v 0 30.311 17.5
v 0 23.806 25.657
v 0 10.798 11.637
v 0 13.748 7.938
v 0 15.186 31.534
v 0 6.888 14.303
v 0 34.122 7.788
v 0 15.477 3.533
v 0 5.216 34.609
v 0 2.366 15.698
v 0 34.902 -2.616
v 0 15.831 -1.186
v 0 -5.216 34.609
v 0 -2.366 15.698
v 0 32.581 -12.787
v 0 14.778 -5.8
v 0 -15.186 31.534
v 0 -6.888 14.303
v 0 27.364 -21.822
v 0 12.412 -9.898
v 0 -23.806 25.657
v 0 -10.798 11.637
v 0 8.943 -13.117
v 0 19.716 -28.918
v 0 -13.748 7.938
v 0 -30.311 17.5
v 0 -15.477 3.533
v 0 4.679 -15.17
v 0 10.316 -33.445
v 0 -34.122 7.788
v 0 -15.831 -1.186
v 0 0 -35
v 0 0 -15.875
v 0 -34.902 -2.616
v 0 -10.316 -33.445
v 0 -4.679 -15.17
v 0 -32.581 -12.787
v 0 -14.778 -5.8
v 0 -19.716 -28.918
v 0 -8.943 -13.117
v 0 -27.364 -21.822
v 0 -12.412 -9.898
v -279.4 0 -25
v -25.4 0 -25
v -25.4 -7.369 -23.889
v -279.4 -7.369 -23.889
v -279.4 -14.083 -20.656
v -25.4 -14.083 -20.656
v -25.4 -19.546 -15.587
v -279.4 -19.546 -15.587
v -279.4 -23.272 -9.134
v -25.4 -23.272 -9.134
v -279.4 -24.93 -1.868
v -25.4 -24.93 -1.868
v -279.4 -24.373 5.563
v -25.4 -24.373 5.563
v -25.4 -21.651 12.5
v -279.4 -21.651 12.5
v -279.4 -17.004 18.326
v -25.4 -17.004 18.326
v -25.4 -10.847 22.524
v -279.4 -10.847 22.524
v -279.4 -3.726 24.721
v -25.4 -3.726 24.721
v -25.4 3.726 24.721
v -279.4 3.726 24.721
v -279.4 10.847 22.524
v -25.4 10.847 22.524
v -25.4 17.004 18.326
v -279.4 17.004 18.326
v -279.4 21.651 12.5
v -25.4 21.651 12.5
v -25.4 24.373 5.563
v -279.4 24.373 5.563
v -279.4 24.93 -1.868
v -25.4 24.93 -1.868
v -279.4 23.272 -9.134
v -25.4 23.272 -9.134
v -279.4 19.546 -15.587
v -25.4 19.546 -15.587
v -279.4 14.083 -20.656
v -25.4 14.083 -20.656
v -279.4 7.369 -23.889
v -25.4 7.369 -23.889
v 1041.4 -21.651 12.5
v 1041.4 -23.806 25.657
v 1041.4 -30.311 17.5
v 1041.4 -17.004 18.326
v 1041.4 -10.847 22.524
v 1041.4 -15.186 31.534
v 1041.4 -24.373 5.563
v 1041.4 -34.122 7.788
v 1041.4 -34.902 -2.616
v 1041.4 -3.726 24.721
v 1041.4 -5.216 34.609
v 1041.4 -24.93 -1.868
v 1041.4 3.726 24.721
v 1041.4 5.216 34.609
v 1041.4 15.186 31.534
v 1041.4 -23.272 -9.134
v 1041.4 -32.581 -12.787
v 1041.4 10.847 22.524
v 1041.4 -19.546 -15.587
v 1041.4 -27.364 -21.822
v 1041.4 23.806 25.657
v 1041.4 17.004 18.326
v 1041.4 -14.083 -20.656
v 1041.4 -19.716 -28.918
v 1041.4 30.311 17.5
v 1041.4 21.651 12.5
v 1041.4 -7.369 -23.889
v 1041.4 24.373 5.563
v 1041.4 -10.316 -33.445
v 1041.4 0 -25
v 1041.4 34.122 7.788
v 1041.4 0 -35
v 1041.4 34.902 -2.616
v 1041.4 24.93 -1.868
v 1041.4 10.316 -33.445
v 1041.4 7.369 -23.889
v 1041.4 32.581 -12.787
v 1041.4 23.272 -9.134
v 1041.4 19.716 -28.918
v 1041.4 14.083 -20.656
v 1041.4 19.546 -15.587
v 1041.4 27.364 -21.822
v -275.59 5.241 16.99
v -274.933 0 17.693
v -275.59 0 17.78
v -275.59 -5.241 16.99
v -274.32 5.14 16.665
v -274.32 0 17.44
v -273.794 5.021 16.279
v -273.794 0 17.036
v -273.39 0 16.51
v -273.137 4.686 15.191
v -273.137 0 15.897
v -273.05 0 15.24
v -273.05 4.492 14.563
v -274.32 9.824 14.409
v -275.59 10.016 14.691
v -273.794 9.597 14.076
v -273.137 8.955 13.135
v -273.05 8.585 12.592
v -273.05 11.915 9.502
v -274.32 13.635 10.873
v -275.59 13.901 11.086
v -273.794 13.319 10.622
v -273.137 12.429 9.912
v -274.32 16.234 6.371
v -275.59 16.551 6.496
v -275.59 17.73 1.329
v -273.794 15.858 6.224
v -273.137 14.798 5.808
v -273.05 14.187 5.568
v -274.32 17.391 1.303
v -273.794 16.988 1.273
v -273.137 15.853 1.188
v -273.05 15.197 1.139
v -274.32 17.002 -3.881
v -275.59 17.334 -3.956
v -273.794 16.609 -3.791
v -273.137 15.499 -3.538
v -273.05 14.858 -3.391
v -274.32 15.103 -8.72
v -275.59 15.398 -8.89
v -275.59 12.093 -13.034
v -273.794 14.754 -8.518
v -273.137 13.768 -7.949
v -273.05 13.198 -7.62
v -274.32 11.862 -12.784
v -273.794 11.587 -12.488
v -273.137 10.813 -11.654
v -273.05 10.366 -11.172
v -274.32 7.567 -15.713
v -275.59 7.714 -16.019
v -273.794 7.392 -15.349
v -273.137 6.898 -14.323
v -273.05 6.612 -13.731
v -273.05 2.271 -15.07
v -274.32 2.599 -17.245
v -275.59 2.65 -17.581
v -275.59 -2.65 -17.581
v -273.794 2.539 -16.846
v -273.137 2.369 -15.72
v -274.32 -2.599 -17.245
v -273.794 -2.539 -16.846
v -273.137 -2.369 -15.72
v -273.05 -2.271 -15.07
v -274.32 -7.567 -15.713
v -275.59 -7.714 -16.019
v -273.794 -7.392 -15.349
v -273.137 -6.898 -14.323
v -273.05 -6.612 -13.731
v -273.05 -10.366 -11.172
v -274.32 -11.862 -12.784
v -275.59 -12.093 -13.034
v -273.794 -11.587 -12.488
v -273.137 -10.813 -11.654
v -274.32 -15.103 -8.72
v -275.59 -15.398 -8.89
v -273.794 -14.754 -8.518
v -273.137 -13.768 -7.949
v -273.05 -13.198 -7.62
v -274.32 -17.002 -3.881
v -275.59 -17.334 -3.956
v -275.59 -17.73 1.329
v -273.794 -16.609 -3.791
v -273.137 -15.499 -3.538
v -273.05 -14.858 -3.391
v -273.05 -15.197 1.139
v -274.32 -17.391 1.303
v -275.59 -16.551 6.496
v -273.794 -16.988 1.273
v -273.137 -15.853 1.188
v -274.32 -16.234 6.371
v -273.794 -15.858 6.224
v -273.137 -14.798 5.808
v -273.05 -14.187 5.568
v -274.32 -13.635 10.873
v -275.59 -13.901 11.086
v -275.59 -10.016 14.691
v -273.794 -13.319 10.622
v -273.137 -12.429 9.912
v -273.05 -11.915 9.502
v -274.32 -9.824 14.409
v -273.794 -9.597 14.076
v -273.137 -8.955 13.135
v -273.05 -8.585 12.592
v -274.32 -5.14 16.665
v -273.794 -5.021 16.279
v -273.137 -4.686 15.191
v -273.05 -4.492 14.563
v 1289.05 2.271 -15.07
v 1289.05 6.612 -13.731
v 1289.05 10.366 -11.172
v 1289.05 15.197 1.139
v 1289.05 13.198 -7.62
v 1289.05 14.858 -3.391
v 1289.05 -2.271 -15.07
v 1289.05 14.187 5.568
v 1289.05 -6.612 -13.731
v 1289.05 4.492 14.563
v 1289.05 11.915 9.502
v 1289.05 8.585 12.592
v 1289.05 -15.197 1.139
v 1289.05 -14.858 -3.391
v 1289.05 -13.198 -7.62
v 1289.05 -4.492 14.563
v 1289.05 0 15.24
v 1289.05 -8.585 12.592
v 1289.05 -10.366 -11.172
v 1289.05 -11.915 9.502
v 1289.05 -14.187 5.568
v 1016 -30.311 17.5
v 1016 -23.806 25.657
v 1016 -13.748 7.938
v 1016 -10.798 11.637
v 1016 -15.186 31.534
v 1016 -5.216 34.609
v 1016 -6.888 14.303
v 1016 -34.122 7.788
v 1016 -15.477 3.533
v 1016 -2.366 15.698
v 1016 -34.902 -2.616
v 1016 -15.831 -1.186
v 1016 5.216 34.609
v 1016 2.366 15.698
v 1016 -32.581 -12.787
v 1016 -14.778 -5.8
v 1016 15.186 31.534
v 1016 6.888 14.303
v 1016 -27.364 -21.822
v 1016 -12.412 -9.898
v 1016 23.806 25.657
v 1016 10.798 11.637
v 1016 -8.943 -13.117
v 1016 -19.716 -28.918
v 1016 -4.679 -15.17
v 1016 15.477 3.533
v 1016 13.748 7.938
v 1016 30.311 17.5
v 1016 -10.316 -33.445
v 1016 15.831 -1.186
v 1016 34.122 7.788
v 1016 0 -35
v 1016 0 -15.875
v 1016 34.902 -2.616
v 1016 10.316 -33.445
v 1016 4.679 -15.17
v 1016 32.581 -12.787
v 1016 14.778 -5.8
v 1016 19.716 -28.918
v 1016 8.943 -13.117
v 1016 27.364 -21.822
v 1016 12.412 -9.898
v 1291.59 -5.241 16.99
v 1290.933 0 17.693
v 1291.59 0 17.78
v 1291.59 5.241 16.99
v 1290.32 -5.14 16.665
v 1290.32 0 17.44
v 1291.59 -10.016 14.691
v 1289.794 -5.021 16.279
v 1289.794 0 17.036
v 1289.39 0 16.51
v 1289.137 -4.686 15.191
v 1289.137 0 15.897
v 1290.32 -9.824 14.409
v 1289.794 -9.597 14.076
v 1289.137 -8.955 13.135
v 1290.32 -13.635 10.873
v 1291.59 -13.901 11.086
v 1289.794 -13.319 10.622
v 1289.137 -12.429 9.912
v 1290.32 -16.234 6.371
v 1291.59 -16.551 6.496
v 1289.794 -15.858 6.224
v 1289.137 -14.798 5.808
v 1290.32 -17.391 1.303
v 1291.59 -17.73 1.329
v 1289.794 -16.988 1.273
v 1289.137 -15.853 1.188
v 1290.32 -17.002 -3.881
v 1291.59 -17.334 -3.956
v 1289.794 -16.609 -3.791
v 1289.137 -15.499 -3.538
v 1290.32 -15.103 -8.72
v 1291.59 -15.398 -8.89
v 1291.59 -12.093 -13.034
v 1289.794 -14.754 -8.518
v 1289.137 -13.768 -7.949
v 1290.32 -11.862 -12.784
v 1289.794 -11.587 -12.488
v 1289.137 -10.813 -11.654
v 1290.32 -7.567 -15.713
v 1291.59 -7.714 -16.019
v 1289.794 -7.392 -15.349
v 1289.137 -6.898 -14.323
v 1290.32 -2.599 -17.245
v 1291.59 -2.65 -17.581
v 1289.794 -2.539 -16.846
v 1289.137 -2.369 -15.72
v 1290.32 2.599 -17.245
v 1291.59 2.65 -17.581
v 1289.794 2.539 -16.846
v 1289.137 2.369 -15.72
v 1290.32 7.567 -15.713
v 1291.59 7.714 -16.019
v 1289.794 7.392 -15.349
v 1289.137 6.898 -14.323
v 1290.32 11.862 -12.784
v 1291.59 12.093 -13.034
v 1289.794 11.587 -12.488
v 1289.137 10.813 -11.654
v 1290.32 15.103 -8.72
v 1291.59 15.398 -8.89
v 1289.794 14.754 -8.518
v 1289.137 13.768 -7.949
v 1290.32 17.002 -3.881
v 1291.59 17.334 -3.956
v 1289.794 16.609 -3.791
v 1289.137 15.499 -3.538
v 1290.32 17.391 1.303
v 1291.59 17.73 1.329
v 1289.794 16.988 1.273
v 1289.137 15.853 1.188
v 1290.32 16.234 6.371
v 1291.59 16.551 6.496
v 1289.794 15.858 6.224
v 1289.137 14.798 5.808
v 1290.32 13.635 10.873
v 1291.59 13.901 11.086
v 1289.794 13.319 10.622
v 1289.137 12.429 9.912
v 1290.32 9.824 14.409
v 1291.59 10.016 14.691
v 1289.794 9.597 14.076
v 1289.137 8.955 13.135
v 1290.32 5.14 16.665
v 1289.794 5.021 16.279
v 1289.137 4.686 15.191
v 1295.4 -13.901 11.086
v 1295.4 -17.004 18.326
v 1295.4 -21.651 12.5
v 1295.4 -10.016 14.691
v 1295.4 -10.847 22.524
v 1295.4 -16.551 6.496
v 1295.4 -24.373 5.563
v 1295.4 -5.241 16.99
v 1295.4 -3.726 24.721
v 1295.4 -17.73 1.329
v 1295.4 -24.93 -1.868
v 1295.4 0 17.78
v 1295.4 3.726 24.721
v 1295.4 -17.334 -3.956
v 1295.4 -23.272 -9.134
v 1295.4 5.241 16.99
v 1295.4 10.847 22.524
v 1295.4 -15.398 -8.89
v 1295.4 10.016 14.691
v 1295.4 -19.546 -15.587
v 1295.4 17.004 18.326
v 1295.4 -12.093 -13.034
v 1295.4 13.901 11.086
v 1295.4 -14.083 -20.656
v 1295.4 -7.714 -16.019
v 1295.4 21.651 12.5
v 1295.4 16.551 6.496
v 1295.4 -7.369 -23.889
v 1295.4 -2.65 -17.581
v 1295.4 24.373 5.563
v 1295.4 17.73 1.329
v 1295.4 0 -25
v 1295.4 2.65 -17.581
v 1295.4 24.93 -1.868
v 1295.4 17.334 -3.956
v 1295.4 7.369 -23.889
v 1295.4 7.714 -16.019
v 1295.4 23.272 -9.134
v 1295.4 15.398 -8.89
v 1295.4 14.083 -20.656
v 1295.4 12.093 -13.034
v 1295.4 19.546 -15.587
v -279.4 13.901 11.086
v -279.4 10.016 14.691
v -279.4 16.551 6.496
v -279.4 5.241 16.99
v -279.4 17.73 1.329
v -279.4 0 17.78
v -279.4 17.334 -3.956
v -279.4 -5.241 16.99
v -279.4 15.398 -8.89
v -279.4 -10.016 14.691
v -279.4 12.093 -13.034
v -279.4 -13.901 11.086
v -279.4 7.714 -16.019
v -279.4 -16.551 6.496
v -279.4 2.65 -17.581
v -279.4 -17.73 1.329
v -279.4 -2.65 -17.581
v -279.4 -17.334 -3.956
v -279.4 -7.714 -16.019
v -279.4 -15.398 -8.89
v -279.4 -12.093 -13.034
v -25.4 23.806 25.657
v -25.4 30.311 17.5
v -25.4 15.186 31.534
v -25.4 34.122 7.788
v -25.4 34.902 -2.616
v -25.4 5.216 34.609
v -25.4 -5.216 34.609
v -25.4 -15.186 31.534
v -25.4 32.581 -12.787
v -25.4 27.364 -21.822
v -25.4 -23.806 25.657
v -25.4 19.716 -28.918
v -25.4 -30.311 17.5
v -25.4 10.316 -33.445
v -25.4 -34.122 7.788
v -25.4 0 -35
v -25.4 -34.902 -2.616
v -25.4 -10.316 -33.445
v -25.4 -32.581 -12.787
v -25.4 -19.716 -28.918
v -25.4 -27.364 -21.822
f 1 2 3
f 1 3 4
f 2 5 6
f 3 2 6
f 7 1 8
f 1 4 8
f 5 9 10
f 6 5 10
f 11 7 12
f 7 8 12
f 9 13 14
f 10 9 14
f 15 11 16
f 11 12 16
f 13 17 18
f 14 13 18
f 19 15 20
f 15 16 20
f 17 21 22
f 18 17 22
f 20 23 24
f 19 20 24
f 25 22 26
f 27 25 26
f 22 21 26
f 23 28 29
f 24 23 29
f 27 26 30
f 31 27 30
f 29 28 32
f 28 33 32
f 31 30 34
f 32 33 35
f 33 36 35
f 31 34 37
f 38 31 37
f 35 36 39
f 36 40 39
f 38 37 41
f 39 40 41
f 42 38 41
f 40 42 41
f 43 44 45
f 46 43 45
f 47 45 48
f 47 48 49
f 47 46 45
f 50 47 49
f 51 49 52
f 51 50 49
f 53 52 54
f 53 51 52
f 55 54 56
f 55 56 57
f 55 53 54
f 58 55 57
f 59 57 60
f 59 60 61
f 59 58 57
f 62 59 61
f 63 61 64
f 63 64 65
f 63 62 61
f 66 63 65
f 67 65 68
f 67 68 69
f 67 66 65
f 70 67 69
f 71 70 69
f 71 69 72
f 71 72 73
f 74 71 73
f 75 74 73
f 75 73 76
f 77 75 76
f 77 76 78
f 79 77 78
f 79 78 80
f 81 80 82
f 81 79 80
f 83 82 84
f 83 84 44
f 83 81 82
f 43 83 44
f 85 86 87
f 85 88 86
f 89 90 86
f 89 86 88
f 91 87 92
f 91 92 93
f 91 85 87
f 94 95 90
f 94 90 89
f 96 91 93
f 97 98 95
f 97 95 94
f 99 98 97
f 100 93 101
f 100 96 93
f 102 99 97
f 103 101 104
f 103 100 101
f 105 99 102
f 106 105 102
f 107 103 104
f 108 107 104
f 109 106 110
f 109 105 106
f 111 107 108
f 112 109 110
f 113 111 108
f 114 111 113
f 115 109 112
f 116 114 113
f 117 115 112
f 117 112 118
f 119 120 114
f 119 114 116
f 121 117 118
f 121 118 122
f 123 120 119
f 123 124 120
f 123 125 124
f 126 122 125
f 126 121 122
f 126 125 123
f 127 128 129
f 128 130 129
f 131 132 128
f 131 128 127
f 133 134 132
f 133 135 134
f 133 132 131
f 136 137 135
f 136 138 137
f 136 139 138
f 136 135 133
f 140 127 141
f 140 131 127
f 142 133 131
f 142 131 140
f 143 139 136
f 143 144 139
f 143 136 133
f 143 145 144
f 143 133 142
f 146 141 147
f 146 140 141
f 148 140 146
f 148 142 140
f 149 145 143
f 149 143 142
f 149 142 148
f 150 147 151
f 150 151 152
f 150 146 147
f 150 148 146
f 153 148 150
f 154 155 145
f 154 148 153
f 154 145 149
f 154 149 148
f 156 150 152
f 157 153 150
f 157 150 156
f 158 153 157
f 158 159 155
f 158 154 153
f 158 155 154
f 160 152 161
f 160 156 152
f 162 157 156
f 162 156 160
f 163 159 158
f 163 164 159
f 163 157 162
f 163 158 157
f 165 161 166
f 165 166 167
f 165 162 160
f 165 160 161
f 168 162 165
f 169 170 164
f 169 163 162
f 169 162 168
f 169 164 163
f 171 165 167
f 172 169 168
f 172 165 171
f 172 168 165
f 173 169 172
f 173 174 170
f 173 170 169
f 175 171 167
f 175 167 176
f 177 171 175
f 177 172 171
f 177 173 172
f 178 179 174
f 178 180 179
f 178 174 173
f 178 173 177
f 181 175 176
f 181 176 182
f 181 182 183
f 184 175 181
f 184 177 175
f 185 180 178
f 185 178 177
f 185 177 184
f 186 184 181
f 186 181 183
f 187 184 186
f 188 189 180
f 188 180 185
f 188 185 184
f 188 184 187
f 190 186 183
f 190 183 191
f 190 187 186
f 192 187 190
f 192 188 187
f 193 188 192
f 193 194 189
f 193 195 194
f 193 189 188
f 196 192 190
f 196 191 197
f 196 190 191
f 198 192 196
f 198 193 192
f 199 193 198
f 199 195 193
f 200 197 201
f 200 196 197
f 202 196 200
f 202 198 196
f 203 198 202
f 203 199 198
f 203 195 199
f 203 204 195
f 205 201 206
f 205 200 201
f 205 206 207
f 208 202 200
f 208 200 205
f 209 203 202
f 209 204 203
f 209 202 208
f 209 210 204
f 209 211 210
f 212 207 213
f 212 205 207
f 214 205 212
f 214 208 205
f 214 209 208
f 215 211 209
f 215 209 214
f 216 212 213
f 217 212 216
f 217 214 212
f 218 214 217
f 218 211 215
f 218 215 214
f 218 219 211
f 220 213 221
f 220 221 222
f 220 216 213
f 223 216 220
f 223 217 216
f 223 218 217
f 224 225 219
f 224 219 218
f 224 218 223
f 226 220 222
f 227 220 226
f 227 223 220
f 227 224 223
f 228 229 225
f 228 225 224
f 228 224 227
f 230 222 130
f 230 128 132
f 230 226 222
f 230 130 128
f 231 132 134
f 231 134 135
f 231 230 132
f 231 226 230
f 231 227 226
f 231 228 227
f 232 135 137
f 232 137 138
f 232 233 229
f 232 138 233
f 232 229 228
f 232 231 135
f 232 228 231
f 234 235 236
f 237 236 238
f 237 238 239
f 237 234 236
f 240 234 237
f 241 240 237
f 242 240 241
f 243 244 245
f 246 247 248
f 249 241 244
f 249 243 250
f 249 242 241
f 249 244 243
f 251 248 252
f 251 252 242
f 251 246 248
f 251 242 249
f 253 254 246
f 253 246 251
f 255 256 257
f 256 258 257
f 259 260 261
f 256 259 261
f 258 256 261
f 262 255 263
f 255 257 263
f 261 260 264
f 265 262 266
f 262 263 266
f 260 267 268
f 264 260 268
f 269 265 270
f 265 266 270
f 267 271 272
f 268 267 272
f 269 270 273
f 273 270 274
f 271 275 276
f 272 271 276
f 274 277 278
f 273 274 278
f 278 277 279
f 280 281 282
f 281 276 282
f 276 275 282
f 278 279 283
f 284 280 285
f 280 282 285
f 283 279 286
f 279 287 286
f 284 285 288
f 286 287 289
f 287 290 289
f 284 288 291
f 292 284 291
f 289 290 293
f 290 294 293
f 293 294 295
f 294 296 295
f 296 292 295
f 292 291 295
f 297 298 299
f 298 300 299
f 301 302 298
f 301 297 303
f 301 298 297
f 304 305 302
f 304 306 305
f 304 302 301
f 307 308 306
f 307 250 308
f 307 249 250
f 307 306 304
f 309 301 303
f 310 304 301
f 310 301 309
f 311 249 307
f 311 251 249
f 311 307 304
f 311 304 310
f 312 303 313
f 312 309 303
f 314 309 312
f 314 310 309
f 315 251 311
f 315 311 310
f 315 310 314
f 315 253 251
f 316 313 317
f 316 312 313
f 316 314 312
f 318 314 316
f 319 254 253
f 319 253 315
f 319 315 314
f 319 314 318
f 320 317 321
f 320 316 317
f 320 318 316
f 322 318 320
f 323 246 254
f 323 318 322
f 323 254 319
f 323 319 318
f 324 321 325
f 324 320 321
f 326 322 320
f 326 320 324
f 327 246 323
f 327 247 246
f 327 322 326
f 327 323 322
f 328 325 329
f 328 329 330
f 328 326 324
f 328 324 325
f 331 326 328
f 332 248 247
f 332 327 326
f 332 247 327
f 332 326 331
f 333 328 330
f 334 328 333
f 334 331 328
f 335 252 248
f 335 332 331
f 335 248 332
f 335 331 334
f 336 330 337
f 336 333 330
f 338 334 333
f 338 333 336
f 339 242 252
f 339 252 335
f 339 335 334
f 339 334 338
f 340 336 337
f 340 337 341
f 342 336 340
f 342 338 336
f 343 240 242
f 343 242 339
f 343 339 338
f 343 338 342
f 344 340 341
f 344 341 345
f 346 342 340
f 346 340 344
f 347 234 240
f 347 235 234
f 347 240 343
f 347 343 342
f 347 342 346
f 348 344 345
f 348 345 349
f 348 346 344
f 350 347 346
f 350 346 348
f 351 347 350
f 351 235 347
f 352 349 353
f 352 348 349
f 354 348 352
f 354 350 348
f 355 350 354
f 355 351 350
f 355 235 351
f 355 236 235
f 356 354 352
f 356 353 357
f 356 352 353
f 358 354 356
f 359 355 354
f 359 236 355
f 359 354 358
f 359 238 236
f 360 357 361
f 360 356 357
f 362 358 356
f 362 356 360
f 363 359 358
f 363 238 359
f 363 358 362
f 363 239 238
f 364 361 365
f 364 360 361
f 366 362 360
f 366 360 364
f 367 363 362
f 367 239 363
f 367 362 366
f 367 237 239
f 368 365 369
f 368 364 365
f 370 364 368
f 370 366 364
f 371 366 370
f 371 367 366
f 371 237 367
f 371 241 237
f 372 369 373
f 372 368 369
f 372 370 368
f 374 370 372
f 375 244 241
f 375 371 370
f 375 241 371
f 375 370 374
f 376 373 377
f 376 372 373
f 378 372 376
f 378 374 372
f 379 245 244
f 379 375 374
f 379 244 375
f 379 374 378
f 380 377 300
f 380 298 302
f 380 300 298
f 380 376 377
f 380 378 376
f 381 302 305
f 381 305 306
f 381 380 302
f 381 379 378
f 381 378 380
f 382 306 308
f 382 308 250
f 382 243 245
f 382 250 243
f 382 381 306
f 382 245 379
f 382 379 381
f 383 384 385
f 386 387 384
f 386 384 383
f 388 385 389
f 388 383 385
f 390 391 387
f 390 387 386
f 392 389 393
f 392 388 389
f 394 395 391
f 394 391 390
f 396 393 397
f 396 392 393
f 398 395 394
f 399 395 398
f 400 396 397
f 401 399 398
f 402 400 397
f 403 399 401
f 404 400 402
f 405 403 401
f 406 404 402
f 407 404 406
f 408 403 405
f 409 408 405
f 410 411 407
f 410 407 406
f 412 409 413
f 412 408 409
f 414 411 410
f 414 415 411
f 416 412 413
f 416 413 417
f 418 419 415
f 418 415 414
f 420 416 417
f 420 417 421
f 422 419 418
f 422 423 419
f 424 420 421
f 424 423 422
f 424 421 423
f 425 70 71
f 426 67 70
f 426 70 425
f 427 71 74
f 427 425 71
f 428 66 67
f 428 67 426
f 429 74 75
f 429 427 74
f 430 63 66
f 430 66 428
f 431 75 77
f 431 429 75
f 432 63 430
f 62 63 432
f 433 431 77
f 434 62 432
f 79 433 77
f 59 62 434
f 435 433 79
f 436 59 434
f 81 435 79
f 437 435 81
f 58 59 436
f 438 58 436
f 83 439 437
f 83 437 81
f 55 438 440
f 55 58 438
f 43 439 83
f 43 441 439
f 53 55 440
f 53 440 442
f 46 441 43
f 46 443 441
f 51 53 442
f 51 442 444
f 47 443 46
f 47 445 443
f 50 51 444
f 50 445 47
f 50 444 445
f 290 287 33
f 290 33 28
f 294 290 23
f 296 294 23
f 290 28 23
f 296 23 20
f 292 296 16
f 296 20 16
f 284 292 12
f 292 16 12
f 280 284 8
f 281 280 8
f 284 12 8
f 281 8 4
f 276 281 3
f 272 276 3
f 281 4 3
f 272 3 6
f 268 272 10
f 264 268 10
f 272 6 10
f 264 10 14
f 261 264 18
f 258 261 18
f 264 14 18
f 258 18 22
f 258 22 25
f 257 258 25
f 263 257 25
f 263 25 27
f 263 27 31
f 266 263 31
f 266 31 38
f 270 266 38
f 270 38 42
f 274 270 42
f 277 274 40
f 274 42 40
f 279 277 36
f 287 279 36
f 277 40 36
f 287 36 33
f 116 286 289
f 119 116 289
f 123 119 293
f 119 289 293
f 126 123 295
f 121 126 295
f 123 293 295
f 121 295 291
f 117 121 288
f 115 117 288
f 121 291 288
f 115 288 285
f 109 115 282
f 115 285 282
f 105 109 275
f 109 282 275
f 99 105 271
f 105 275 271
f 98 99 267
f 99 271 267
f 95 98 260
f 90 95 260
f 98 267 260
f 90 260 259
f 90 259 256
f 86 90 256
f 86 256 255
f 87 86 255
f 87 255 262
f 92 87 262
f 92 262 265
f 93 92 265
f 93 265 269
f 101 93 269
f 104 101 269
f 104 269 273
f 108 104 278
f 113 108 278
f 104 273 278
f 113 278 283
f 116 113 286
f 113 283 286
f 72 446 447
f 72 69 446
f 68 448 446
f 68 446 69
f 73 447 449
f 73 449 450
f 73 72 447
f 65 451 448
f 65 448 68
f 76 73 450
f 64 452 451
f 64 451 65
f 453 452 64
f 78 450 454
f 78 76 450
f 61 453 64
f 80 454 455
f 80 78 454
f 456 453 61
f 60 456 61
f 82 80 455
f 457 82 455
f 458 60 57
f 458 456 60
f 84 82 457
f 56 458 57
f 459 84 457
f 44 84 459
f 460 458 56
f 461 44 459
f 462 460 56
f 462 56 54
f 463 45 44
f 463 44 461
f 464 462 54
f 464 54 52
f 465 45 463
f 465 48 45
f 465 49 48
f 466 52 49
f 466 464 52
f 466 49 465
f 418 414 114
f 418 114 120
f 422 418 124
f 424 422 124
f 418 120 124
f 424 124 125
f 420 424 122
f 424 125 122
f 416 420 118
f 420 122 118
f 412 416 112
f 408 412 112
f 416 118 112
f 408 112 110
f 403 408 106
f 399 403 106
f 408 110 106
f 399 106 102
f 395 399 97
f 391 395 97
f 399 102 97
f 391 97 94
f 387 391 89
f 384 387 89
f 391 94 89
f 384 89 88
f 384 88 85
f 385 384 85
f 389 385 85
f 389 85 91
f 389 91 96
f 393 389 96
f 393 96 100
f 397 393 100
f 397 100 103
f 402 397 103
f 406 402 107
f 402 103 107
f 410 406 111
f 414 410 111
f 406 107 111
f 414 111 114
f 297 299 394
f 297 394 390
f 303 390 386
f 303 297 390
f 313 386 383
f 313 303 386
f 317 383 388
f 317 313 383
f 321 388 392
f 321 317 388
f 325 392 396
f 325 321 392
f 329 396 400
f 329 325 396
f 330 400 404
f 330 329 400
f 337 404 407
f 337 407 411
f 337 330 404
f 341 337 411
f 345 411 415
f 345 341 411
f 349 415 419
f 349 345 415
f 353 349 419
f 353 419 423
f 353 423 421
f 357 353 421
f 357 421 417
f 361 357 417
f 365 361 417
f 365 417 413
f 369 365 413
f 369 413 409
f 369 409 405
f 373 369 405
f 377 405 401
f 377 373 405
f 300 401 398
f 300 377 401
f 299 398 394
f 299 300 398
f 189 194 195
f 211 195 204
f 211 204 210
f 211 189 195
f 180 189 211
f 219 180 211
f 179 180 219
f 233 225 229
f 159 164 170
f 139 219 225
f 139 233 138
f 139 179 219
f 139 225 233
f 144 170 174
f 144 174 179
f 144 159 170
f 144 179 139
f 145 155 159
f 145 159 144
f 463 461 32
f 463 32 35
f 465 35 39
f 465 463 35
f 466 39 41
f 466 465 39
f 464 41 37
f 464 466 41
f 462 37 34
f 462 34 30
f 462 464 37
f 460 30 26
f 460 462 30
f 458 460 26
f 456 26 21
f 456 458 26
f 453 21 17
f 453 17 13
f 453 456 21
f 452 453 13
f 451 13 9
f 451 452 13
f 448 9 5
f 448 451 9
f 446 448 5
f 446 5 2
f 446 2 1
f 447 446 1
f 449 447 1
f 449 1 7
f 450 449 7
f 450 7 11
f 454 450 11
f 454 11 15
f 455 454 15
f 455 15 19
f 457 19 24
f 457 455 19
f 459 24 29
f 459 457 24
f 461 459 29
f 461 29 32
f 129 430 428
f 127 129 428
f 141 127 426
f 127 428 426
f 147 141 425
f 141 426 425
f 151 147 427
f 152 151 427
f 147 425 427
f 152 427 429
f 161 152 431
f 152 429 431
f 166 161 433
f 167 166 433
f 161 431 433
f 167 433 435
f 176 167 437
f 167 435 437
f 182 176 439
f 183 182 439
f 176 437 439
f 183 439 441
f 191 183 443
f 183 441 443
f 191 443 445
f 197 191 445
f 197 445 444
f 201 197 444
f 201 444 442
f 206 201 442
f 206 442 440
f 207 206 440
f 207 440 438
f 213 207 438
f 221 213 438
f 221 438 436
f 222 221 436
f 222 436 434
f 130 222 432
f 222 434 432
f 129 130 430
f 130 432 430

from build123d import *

# Parameters (mm, degrees)
SKETCH1_R           = 15.875
BOSS_EXTRUDE1_DEPTH = 1016
SKETCH2_R           = 34.999999977
BOSS_EXTRUDE2_DEPTH = 25.4
BOSS_EXTRUDE3_START = 25.4
SKETCH3_R           = 34.999999977
BOSS_EXTRUDE3_DEPTH = 25.4
SKETCH4_R           = 25
BOSS_EXTRUDE4_DEPTH = 254
BOSS_EXTRUDE5_START = 254
SKETCH5_R           = 25
BOSS_EXTRUDE5_DEPTH = 254
SKETCH6_R           = 17.78
CUT_EXTRUDE1_DEPTH  = 6.35
CUT_EXTRUDE2_START  = -6.35
SKETCH7_R           = 17.78
CUT_EXTRUDE2_DEPTH  = 6.35
FILLET1_R           = 2.54


with BuildPart() as part:
    # Sketch1 → Boss-Extrude1 (new body)
    with BuildSketch(Plane(origin=(0, 0, 0), x_dir=(0, 0, -1), z_dir=(1, 0, 0))):
        Circle(SKETCH1_R)
    extrude(amount=BOSS_EXTRUDE1_DEPTH)

    # Sketch2 → Boss-Extrude2 (add)
    with BuildSketch(Plane(origin=(1016, 0, 0), x_dir=(0, 0, -1), z_dir=(1, 0, 0))):
        Circle(SKETCH2_R)
    extrude(amount=BOSS_EXTRUDE2_DEPTH)

    # Sketch3 → Boss-Extrude3 (add)
    with BuildSketch(Plane.ZY.offset(BOSS_EXTRUDE3_START)):
        with Locations(Location((0, 0, 0), (0, 0, 180))):
            Circle(SKETCH3_R)
    extrude(amount=-BOSS_EXTRUDE3_DEPTH)

    # Sketch4 → Boss-Extrude4 (add)
    with BuildSketch(Plane(origin=(1041.4, 0, 0), x_dir=(0, 0, -1), z_dir=(1, 0, 0))):
        Circle(SKETCH4_R)
    extrude(amount=BOSS_EXTRUDE4_DEPTH)

    # Sketch5 → Boss-Extrude5 (add)
    with BuildSketch(Plane.ZY.offset(25.4).offset(BOSS_EXTRUDE5_START)):
        with Locations(Location((0, 0, 0), (0, 0, 180))):
            Circle(SKETCH5_R)
    extrude(amount=-BOSS_EXTRUDE5_DEPTH)

    # Sketch6 → Cut-Extrude1 (cut)
    with BuildSketch(Plane.ZY.offset(279.4)):
        Circle(SKETCH6_R)
    extrude(amount=-CUT_EXTRUDE1_DEPTH, mode=Mode.SUBTRACT)

    # Sketch7 → Cut-Extrude2 (cut)
    with BuildSketch(Plane(origin=(1295.4, 0, 0), x_dir=(0, 0, -1), z_dir=(1, 0, 0)).offset(CUT_EXTRUDE2_START)):
        with Locations(Location((0, 0, 0), (0, 0, 180))):
            Circle(SKETCH7_R)
    extrude(amount=CUT_EXTRUDE2_DEPTH, mode=Mode.SUBTRACT)

    # Fillet1
    fillet1_edges = [part.edges().sort_by_distance(p)[0] for p in [
        (-273.05, 0, -17.78),
        (1289.05, 0, -17.78),
    ]]
    fillet(fillet1_edges, radius=FILLET1_R)


solid = part.part
